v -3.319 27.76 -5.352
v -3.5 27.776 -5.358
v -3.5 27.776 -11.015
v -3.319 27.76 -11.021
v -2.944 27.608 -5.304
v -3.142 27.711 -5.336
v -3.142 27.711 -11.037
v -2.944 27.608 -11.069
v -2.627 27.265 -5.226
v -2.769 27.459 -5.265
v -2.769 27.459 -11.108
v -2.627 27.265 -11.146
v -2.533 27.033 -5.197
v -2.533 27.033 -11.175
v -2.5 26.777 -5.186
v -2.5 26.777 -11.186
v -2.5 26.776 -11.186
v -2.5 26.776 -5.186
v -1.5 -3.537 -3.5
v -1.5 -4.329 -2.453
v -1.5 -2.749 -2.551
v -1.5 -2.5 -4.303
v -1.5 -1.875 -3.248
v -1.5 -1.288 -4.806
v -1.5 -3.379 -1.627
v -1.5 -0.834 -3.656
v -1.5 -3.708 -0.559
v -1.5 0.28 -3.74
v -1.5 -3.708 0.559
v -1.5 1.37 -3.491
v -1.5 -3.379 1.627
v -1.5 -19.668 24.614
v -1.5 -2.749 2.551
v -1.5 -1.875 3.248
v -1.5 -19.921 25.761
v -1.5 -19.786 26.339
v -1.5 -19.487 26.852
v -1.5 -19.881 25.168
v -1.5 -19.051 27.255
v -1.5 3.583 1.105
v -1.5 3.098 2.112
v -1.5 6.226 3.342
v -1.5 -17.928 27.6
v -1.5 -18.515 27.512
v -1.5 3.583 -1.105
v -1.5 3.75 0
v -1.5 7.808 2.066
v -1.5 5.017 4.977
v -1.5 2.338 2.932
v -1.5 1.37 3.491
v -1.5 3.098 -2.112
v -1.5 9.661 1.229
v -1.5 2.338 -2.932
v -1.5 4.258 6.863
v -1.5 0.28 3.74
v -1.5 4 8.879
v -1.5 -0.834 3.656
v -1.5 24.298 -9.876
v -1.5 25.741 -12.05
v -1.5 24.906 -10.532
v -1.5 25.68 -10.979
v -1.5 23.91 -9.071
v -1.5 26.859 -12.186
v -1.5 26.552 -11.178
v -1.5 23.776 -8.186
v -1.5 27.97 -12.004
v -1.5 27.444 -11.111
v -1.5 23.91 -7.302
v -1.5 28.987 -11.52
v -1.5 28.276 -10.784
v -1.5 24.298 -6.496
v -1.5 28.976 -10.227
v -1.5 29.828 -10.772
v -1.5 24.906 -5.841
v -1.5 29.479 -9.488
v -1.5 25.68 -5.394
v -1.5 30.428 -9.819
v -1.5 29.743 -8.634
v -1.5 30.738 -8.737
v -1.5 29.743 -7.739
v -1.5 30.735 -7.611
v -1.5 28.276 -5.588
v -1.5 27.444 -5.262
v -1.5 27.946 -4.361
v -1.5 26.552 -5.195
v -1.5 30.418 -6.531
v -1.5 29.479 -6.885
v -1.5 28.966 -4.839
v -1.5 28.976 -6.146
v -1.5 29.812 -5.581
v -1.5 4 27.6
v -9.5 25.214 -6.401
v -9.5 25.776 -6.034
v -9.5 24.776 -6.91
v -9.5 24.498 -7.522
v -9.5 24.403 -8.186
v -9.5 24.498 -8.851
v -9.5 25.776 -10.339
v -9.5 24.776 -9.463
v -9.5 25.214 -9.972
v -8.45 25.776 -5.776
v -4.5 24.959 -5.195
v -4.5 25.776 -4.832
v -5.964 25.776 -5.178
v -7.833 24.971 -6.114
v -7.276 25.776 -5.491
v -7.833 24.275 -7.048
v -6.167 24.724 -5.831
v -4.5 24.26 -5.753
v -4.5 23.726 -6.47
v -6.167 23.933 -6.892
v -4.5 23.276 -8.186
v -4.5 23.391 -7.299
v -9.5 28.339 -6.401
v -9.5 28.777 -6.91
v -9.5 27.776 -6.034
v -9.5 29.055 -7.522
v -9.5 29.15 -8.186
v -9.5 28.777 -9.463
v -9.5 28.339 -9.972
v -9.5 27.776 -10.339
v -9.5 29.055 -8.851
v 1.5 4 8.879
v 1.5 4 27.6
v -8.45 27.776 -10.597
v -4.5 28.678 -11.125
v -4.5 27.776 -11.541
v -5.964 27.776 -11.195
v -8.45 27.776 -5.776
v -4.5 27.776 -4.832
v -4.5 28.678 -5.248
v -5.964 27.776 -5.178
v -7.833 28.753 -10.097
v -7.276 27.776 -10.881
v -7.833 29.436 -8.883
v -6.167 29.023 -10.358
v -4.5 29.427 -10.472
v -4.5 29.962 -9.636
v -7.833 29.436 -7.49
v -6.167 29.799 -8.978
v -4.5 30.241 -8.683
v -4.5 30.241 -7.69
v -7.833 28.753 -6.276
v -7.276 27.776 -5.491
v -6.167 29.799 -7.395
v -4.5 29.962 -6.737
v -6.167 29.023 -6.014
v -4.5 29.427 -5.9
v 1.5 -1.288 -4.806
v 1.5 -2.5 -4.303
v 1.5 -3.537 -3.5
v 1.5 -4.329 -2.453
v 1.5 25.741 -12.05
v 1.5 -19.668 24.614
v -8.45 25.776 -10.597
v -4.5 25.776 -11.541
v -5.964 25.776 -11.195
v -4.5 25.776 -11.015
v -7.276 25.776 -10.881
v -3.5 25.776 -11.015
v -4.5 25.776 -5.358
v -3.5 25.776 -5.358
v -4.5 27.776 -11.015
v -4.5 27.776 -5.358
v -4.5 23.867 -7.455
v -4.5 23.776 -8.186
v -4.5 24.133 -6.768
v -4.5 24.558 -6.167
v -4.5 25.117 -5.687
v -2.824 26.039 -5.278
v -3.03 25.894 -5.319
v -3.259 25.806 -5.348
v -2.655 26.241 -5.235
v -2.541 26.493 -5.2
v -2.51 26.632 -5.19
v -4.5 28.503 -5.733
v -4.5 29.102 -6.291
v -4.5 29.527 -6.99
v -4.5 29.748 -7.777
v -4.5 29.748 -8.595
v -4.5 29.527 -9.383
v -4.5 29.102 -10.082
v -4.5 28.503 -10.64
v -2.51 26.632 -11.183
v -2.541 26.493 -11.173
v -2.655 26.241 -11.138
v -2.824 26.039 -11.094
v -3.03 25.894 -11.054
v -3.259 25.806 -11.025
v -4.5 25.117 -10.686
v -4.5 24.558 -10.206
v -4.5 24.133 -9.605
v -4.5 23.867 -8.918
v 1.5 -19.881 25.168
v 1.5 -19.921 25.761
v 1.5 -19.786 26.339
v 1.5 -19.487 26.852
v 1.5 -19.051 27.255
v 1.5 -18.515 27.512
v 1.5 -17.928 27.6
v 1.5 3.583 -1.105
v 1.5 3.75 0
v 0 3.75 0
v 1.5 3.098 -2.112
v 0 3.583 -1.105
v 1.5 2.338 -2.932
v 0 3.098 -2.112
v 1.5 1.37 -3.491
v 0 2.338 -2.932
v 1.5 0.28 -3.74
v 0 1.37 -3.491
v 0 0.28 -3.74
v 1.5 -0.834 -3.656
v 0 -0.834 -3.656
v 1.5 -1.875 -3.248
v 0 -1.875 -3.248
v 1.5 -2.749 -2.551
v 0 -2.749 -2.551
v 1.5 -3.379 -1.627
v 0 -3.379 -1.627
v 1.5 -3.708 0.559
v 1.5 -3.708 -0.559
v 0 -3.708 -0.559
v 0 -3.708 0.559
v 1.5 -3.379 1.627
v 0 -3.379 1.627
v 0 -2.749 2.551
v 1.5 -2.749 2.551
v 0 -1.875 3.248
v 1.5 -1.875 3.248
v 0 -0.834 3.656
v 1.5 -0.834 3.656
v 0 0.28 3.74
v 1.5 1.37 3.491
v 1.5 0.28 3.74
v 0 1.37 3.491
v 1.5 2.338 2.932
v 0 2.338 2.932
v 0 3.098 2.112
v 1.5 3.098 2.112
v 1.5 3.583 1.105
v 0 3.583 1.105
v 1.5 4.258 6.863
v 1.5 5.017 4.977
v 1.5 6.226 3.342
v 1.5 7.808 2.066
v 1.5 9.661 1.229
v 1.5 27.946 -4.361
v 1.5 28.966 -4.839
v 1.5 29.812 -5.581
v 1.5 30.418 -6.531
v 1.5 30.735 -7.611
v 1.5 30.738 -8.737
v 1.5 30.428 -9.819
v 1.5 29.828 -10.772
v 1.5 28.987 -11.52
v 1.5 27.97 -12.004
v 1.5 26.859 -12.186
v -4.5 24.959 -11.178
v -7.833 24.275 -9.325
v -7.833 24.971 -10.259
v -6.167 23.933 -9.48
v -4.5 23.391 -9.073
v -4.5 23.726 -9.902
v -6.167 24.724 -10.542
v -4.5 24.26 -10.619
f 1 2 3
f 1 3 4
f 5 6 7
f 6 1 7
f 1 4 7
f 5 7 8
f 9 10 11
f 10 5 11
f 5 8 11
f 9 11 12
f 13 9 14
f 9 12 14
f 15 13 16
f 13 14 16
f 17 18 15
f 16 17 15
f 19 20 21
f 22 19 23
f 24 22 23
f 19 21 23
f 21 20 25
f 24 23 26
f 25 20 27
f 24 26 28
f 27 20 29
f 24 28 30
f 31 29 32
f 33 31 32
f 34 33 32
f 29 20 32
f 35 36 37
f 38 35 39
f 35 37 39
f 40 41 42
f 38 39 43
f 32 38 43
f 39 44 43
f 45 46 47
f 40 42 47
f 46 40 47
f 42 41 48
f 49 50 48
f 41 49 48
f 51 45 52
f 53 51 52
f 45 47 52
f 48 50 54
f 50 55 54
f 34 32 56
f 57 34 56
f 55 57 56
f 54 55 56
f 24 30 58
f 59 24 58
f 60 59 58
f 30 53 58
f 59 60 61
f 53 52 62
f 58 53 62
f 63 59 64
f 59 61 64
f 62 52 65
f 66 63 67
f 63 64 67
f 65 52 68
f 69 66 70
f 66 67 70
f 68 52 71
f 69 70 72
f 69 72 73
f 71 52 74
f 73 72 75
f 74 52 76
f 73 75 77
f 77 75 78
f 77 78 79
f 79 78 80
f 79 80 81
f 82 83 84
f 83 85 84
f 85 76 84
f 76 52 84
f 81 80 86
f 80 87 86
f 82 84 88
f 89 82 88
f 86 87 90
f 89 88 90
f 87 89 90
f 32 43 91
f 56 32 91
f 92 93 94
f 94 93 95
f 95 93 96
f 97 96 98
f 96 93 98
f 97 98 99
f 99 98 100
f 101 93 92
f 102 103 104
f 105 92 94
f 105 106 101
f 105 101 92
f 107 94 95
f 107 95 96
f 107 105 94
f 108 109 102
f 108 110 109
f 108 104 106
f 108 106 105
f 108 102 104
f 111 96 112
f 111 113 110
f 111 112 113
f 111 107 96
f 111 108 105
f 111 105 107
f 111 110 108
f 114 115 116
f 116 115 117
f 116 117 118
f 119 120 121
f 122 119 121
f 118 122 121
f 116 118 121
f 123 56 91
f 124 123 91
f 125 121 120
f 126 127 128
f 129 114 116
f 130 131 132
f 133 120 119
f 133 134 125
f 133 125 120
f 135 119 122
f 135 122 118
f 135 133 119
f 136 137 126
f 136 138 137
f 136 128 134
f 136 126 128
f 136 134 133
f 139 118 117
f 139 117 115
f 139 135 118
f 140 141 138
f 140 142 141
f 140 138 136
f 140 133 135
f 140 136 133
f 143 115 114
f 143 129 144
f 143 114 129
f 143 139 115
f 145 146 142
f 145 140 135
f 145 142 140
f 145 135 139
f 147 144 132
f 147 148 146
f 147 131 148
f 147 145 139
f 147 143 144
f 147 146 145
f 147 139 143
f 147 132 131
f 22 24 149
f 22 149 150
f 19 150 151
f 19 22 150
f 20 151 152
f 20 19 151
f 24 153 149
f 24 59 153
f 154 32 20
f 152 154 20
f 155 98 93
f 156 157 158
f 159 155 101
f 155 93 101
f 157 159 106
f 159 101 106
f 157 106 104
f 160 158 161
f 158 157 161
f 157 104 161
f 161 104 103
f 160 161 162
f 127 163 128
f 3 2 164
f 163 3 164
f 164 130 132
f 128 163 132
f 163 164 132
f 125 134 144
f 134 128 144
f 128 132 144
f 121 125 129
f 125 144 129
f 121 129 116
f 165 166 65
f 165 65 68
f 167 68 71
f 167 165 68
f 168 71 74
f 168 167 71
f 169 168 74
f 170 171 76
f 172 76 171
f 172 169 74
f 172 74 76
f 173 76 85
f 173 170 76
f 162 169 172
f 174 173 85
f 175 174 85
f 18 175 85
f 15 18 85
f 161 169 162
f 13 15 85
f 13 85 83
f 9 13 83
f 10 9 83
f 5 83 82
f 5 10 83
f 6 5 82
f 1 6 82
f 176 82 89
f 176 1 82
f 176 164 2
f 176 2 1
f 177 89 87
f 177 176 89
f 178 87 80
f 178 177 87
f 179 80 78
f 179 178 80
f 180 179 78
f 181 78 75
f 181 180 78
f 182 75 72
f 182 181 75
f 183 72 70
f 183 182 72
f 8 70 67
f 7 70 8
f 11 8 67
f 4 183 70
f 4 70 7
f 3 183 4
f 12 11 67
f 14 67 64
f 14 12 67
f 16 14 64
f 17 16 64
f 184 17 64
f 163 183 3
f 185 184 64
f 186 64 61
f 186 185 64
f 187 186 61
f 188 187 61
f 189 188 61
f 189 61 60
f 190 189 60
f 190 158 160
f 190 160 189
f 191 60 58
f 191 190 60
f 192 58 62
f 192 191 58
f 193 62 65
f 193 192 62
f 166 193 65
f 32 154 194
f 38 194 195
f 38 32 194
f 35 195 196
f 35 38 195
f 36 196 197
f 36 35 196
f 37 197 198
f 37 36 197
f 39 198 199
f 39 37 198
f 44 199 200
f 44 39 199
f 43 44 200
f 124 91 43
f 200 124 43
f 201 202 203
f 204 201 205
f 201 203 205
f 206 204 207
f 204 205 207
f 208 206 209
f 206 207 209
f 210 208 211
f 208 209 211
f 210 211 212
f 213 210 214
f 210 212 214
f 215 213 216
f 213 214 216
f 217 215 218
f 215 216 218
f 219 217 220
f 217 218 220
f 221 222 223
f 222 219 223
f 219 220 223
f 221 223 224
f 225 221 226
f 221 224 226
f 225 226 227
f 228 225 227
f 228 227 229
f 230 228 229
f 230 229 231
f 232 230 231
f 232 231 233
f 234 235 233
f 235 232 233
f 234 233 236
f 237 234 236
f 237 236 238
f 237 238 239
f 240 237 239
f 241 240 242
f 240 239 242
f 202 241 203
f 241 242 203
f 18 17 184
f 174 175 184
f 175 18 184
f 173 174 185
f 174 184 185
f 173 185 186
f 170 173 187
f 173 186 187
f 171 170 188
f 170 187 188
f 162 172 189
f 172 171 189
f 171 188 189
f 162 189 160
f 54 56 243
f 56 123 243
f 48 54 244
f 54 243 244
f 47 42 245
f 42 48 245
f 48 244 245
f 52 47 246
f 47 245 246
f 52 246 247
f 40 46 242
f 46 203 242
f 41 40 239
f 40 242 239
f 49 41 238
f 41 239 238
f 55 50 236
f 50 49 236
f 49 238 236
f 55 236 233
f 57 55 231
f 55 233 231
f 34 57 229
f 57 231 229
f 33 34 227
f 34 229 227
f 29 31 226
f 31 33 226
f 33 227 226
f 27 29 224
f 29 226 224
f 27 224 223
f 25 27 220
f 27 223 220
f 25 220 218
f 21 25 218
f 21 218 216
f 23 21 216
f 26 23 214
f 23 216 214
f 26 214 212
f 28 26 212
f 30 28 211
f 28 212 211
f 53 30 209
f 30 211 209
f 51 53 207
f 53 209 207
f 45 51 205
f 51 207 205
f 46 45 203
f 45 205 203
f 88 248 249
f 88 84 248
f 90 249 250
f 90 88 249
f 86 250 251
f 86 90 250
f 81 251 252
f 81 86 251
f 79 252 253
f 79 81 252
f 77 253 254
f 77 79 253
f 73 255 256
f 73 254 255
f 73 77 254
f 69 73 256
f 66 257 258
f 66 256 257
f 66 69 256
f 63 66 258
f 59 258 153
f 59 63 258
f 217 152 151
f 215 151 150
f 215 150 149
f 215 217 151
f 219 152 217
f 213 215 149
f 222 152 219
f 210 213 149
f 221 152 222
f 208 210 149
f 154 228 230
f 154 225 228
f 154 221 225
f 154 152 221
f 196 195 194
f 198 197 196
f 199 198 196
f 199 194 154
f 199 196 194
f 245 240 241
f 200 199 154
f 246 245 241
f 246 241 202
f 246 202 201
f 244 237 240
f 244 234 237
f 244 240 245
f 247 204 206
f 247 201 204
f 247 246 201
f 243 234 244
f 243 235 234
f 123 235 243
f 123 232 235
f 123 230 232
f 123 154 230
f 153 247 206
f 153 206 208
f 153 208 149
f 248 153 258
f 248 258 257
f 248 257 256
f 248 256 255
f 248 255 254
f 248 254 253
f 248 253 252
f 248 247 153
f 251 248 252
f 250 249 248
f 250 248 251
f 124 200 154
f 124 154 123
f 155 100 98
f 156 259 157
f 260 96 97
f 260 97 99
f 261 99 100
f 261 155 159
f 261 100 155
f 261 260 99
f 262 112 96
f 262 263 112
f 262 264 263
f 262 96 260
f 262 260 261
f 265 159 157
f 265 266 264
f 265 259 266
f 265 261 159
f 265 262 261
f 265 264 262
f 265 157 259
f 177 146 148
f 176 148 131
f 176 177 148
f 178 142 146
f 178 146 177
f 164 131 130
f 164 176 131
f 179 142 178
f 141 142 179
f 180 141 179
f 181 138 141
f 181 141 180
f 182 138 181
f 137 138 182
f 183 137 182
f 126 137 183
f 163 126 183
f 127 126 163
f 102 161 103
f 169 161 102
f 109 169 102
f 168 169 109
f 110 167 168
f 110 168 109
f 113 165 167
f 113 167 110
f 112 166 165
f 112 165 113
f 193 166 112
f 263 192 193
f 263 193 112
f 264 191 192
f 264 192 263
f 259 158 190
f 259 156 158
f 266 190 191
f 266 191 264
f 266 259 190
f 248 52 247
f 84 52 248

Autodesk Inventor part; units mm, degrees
ref_plane "YZ Plane" through (0, 0, 0) normal (1, 0, 0) x (0, 1, 0)
ref_plane "XZ Plane" through (0, 0, 0) normal (0, 1, 0) x (-1, 0, 0)
sketch "Boceto4" plane through (0, 0, 0) normal (1, 0, 0) x (0, 1, 0)
  line L0 (0, 0) -> (0, 25.2)
  line L1 (0, 0) -> (26.7765, -8.1864)
  line L2 (0, 0) -> (28, 0) construction
  line L3 (4, 25.2) -> (4, 2.9598)
  line L4 (4, 2.9598) -> (27.946, -4.3612)
  circle A0 centre (26.7765, -8.1864) radius 4
  circle A1 centre (0, 0) radius 4.976
  line L5 (0, 25.2) -> (-20, 25.2)
  line L6 (-20, 25.2) -> (-4.3292, -2.4533)
  line L7 (25.7411, -12.0501) -> (-1.2881, -4.8064)
  line L8 (4, 25.2) -> (4, 27.6)
  line L9 (4, 27.6) -> (-17.9279, 27.6)
  line L10 (-19.6679, 24.6139) -> (-20, 25.2)
  arc A2 (-17.9279, 27.6) -> (-19.6679, 24.6139) centre (-17.9279, 25.6) ccw
  circle A3 centre (0, 0) radius 3.75
  point P0 (-19.8875, 25.2)
  point P1 (-19.6679, 24.6139)
  dimension "d18" = 25.2
  dimension "d20" = 28
  dimension "d22" = 4
  dimension "d23" = 20
  dimension "d24" = 2.4
  dimension "d25" = 2
  dimension "d26" = 7.5
  dimension "d44" = 107
  dimension "d45" = 2.4
extrude "Extrusión2" add sketch "Boceto4" along normal mid plane 3 contours A3 L1 A1 L0 | L0 A1 L1 A3 | A1 L6 A2 L5 L0 | L0 L5 A2 L9 L8 L3 A1 | A1 L4 A0 L1 | L1 A0 L7 A1 | A0
fillet "Empalme1" radius 8 1 edges at (0, 4, 2.9598)
ref_plane "Plano de trabajo3" through (0, 0, -8.1864) normal (0, 0, 1) x (1, 0, 0)
sketch "Boceto5" plane through (0, 0, -8.1864) normal (0, 0, 1) x (1, 0, 0)
  line L0 (0, 0) -> (0, 26.7765)
  line L1 (0, 26.7765) -> (-1.5, 26.7765)
  line L2 (-1.5, 26.7765) -> (-1.5, 23.7765)
  line L3 (-1.5, 30.7765) -> (-1.5, 25.7411) projected
  line L4 (-1.5, 23.7765) -> (-4.5, 23.7765)
  line L5 (-4.5, 23.7765) -> (-4.5, 23.2765)
  line L6 (-4.5, 23.2765) -> (-9.5, 23.2765)
  line L7 (-9.5, 23.2765) -> (-9.5, 26.7765)
  line L8 (-9.5, 26.7765) -> (-9.5, 24.4033)
  line L9 (-9.5, 24.4033) -> (-4.5, 23.2765)
  line L10 (-9.5, 26.7765) -> (-1.5, 26.7765)
  point P0 (-1.5, 27.946)
  dimension "d31" = 26.7765
  dimension "d32" = 1.5
  dimension "d33" = 3
  dimension "d34" = 3
  dimension "d35" = 0.5
  dimension "d36" = 5
  dimension "d37" = 3.5
  dimension "d38" = 2.3732
revolve "Revolución1" add sketch "Boceto5" angle 360 about axis through (-9.5, 26.7765, -8.1864) along (1, 0, 0) contours L2 L4 L5 L9 L7 L10
ref_plane "Plano de trabajo4" through (-3, 26.7765, -11.1864) normal (0, 0, 1) x (1, 0, 0)
sketch "Boceto6" plane through (-3, 26.7765, -11.1864) normal (0, 0, 1) x (1, 0, 0)
  line L0 (-6.5, 2.3732) -> (-6.5, -2.3732) projected
  line L1 (-6.5, 0) -> (-3, 0)
  line L2 (0.5, 1) -> (-6.5, 1)
  line L3 (-6.5, 1) -> (-6.5, -1)
  line L4 (-6.5, -1) -> (0.5, -1)
  line L5 (0.5, -1) -> (0.5, 1)
  line L6 (0.5, 1) -> (-6.5, -1) construction
  line L7 (-6.5, 1) -> (0.5, -1) construction
  point P0 (3, -26.7765)
  point P1 (-6.5, 1)
  dimension "d40" = 3.5
  dimension "d41" = 2
extrude "Extrusión3" cut sketch "Boceto6" against normal mid plane 14
fillet "Empalme2" radius 1 2 edges at (-2.5, 27.7765, -8.1864) (-2.5, 25.7765, -8.1864)
equation "\"d45\" = d24"
equation "\"offset\" = 1"
equation "\"thikness\" = 2"
equation "\"r1\" = 5.55"
equation "\"r2o\" = 59.75"
equation "\"delta_y\" = 6"
equation "\"wire_d\" = 1"
equation "\"width_ang_spring\" = 5"
equation "\"spring_int_diam\" = 8.5"
equation "\"spring_ext_diam\" = 10.5"
equation "\"r3\" = 8.25"
equation "\"r3R\" = 4.75"
equation "\"r3T\" = 6.74537"
equation "\"alpha\" = 54.847297deg"
equation "\"alpha2\" = 270deg"
equation "\"theta3_recogido\" = 305.152703deg"
equation "\"delta_theta_3\" = 45deg"
equation "\"joint_width\" = 12"
equation "\"joint_radius\" = 7.75"
equation "\"shaft_width\" = 15"
equation "\"shaft_joint_diameter\" = 7.75"
equation "\"separation_space\" = 0.5"
equation "\"height_finger\" = 42"
equation "\"cell_screw_head_diameter\" = 4"
equation "\"cell_screw_diameter\" = 2"
equation "\"cell_space\" = 2"
equation "\"cell_width\" = 6"
equation "\"cell_theta_position\" = 60deg"
equation "\"cell_thikness\" = 1"
equation "\"cell_lenght\" = 37"
equation "\"cell_z_space\" = 5"
equation "\"wire_D\" = 2.3"
equation "\"width_link\" = 8"
equation "\"Dt\" = 1.05949"
equation "\"Djoint_shaft\" = 2.3"
equation "\"shaft_x\" = 1.45"
equation "\"shaft_y\" = 6.45"
equation "\"lenght_body_link\" = 186.05"
equation "\"lenght_bar_support\" = 201.65"
equation "\"wire_spring_d\" = 1"
equation "\"spring_int_d\" = 6"
equation "\"spring_lenght\" = 28"
equation "\"trigger_offset\" = 2"
equation "\"e\" = 9"
equation "\"So\" = 17"
equation "\"m2_theta3o\" = -30deg"
equation "\"m2_r3\" = 19.75"
equation "\"m2_delta_theta1\" = 15deg"
equation "\"m2_theta3f\" = -60deg"
equation "\"trigger_thumb_lenght\" = 6"
equation "\"r3_thikness\" = 3.5"
equation "\"tg_width\" = 4"
equation "\"pivot_screw_d\" = 4"
equation "\"sf_lenght\" = 9.5"
equation "\"sf_base\" = 3"
equation "\"sf_head_height\" = 3"
equation "\"sf_head_width\" = 4.5"
equation "\"sf_head_offset\" = 0.25"
equation "\"sf_head_grip_width\" = 2"
equation "\"sf_head_angle\" = 45deg"
equation "\"sf_thikness\" = 5"
equation "\"screw_Dhead\" = 8"
equation "\"screw_d\" = 4"
equation "\"screw_lenght\" = 12"
equation "\"screwJ_base_D\" = 9"
equation "\"screwJ_top_D\" = 13"
equation "\"gj_D\" = 6"
equation "\"gj_d\" = 4"
equation "\"gj_out_section\" = 6"
equation "\"ext_width_slider\" = 3.5"
equation "\"sfbox_tip_width\" = 2.5"
equation "\"slim_width_slider\" = 1.5"
equation "\"agarradera_width\" = 4"
equation "\"int_width_slider\" = 2"
equation "\"agarradera_position\" = 82.13077"
equation "\"sfbox_theta1\" = 60deg"
equation "\"sfbox_theta2\" = 45deg"
equation "\"agarradera_theta\" = 60deg"
equation "\"sfbox_width\" = 1.5"
equation "\"box_fat_slider_lenght\" = 67"
equation "\"fat_width_slider\" = 2"
equation "\"box_in_width\" = 72"
equation "\"flex_separation_theta\" = 60deg"
equation "\"sf_flex_separation\" = 38.66667"
equation "\"thikness_box\" = 1.5"
equation "\"box_slim_slider_lenght\" = 116"
equation "\"box_in_deep\" = 77"
equation "\"box_in_height\" = 35"
properties part number "trigger" material "Plástico PPS"
